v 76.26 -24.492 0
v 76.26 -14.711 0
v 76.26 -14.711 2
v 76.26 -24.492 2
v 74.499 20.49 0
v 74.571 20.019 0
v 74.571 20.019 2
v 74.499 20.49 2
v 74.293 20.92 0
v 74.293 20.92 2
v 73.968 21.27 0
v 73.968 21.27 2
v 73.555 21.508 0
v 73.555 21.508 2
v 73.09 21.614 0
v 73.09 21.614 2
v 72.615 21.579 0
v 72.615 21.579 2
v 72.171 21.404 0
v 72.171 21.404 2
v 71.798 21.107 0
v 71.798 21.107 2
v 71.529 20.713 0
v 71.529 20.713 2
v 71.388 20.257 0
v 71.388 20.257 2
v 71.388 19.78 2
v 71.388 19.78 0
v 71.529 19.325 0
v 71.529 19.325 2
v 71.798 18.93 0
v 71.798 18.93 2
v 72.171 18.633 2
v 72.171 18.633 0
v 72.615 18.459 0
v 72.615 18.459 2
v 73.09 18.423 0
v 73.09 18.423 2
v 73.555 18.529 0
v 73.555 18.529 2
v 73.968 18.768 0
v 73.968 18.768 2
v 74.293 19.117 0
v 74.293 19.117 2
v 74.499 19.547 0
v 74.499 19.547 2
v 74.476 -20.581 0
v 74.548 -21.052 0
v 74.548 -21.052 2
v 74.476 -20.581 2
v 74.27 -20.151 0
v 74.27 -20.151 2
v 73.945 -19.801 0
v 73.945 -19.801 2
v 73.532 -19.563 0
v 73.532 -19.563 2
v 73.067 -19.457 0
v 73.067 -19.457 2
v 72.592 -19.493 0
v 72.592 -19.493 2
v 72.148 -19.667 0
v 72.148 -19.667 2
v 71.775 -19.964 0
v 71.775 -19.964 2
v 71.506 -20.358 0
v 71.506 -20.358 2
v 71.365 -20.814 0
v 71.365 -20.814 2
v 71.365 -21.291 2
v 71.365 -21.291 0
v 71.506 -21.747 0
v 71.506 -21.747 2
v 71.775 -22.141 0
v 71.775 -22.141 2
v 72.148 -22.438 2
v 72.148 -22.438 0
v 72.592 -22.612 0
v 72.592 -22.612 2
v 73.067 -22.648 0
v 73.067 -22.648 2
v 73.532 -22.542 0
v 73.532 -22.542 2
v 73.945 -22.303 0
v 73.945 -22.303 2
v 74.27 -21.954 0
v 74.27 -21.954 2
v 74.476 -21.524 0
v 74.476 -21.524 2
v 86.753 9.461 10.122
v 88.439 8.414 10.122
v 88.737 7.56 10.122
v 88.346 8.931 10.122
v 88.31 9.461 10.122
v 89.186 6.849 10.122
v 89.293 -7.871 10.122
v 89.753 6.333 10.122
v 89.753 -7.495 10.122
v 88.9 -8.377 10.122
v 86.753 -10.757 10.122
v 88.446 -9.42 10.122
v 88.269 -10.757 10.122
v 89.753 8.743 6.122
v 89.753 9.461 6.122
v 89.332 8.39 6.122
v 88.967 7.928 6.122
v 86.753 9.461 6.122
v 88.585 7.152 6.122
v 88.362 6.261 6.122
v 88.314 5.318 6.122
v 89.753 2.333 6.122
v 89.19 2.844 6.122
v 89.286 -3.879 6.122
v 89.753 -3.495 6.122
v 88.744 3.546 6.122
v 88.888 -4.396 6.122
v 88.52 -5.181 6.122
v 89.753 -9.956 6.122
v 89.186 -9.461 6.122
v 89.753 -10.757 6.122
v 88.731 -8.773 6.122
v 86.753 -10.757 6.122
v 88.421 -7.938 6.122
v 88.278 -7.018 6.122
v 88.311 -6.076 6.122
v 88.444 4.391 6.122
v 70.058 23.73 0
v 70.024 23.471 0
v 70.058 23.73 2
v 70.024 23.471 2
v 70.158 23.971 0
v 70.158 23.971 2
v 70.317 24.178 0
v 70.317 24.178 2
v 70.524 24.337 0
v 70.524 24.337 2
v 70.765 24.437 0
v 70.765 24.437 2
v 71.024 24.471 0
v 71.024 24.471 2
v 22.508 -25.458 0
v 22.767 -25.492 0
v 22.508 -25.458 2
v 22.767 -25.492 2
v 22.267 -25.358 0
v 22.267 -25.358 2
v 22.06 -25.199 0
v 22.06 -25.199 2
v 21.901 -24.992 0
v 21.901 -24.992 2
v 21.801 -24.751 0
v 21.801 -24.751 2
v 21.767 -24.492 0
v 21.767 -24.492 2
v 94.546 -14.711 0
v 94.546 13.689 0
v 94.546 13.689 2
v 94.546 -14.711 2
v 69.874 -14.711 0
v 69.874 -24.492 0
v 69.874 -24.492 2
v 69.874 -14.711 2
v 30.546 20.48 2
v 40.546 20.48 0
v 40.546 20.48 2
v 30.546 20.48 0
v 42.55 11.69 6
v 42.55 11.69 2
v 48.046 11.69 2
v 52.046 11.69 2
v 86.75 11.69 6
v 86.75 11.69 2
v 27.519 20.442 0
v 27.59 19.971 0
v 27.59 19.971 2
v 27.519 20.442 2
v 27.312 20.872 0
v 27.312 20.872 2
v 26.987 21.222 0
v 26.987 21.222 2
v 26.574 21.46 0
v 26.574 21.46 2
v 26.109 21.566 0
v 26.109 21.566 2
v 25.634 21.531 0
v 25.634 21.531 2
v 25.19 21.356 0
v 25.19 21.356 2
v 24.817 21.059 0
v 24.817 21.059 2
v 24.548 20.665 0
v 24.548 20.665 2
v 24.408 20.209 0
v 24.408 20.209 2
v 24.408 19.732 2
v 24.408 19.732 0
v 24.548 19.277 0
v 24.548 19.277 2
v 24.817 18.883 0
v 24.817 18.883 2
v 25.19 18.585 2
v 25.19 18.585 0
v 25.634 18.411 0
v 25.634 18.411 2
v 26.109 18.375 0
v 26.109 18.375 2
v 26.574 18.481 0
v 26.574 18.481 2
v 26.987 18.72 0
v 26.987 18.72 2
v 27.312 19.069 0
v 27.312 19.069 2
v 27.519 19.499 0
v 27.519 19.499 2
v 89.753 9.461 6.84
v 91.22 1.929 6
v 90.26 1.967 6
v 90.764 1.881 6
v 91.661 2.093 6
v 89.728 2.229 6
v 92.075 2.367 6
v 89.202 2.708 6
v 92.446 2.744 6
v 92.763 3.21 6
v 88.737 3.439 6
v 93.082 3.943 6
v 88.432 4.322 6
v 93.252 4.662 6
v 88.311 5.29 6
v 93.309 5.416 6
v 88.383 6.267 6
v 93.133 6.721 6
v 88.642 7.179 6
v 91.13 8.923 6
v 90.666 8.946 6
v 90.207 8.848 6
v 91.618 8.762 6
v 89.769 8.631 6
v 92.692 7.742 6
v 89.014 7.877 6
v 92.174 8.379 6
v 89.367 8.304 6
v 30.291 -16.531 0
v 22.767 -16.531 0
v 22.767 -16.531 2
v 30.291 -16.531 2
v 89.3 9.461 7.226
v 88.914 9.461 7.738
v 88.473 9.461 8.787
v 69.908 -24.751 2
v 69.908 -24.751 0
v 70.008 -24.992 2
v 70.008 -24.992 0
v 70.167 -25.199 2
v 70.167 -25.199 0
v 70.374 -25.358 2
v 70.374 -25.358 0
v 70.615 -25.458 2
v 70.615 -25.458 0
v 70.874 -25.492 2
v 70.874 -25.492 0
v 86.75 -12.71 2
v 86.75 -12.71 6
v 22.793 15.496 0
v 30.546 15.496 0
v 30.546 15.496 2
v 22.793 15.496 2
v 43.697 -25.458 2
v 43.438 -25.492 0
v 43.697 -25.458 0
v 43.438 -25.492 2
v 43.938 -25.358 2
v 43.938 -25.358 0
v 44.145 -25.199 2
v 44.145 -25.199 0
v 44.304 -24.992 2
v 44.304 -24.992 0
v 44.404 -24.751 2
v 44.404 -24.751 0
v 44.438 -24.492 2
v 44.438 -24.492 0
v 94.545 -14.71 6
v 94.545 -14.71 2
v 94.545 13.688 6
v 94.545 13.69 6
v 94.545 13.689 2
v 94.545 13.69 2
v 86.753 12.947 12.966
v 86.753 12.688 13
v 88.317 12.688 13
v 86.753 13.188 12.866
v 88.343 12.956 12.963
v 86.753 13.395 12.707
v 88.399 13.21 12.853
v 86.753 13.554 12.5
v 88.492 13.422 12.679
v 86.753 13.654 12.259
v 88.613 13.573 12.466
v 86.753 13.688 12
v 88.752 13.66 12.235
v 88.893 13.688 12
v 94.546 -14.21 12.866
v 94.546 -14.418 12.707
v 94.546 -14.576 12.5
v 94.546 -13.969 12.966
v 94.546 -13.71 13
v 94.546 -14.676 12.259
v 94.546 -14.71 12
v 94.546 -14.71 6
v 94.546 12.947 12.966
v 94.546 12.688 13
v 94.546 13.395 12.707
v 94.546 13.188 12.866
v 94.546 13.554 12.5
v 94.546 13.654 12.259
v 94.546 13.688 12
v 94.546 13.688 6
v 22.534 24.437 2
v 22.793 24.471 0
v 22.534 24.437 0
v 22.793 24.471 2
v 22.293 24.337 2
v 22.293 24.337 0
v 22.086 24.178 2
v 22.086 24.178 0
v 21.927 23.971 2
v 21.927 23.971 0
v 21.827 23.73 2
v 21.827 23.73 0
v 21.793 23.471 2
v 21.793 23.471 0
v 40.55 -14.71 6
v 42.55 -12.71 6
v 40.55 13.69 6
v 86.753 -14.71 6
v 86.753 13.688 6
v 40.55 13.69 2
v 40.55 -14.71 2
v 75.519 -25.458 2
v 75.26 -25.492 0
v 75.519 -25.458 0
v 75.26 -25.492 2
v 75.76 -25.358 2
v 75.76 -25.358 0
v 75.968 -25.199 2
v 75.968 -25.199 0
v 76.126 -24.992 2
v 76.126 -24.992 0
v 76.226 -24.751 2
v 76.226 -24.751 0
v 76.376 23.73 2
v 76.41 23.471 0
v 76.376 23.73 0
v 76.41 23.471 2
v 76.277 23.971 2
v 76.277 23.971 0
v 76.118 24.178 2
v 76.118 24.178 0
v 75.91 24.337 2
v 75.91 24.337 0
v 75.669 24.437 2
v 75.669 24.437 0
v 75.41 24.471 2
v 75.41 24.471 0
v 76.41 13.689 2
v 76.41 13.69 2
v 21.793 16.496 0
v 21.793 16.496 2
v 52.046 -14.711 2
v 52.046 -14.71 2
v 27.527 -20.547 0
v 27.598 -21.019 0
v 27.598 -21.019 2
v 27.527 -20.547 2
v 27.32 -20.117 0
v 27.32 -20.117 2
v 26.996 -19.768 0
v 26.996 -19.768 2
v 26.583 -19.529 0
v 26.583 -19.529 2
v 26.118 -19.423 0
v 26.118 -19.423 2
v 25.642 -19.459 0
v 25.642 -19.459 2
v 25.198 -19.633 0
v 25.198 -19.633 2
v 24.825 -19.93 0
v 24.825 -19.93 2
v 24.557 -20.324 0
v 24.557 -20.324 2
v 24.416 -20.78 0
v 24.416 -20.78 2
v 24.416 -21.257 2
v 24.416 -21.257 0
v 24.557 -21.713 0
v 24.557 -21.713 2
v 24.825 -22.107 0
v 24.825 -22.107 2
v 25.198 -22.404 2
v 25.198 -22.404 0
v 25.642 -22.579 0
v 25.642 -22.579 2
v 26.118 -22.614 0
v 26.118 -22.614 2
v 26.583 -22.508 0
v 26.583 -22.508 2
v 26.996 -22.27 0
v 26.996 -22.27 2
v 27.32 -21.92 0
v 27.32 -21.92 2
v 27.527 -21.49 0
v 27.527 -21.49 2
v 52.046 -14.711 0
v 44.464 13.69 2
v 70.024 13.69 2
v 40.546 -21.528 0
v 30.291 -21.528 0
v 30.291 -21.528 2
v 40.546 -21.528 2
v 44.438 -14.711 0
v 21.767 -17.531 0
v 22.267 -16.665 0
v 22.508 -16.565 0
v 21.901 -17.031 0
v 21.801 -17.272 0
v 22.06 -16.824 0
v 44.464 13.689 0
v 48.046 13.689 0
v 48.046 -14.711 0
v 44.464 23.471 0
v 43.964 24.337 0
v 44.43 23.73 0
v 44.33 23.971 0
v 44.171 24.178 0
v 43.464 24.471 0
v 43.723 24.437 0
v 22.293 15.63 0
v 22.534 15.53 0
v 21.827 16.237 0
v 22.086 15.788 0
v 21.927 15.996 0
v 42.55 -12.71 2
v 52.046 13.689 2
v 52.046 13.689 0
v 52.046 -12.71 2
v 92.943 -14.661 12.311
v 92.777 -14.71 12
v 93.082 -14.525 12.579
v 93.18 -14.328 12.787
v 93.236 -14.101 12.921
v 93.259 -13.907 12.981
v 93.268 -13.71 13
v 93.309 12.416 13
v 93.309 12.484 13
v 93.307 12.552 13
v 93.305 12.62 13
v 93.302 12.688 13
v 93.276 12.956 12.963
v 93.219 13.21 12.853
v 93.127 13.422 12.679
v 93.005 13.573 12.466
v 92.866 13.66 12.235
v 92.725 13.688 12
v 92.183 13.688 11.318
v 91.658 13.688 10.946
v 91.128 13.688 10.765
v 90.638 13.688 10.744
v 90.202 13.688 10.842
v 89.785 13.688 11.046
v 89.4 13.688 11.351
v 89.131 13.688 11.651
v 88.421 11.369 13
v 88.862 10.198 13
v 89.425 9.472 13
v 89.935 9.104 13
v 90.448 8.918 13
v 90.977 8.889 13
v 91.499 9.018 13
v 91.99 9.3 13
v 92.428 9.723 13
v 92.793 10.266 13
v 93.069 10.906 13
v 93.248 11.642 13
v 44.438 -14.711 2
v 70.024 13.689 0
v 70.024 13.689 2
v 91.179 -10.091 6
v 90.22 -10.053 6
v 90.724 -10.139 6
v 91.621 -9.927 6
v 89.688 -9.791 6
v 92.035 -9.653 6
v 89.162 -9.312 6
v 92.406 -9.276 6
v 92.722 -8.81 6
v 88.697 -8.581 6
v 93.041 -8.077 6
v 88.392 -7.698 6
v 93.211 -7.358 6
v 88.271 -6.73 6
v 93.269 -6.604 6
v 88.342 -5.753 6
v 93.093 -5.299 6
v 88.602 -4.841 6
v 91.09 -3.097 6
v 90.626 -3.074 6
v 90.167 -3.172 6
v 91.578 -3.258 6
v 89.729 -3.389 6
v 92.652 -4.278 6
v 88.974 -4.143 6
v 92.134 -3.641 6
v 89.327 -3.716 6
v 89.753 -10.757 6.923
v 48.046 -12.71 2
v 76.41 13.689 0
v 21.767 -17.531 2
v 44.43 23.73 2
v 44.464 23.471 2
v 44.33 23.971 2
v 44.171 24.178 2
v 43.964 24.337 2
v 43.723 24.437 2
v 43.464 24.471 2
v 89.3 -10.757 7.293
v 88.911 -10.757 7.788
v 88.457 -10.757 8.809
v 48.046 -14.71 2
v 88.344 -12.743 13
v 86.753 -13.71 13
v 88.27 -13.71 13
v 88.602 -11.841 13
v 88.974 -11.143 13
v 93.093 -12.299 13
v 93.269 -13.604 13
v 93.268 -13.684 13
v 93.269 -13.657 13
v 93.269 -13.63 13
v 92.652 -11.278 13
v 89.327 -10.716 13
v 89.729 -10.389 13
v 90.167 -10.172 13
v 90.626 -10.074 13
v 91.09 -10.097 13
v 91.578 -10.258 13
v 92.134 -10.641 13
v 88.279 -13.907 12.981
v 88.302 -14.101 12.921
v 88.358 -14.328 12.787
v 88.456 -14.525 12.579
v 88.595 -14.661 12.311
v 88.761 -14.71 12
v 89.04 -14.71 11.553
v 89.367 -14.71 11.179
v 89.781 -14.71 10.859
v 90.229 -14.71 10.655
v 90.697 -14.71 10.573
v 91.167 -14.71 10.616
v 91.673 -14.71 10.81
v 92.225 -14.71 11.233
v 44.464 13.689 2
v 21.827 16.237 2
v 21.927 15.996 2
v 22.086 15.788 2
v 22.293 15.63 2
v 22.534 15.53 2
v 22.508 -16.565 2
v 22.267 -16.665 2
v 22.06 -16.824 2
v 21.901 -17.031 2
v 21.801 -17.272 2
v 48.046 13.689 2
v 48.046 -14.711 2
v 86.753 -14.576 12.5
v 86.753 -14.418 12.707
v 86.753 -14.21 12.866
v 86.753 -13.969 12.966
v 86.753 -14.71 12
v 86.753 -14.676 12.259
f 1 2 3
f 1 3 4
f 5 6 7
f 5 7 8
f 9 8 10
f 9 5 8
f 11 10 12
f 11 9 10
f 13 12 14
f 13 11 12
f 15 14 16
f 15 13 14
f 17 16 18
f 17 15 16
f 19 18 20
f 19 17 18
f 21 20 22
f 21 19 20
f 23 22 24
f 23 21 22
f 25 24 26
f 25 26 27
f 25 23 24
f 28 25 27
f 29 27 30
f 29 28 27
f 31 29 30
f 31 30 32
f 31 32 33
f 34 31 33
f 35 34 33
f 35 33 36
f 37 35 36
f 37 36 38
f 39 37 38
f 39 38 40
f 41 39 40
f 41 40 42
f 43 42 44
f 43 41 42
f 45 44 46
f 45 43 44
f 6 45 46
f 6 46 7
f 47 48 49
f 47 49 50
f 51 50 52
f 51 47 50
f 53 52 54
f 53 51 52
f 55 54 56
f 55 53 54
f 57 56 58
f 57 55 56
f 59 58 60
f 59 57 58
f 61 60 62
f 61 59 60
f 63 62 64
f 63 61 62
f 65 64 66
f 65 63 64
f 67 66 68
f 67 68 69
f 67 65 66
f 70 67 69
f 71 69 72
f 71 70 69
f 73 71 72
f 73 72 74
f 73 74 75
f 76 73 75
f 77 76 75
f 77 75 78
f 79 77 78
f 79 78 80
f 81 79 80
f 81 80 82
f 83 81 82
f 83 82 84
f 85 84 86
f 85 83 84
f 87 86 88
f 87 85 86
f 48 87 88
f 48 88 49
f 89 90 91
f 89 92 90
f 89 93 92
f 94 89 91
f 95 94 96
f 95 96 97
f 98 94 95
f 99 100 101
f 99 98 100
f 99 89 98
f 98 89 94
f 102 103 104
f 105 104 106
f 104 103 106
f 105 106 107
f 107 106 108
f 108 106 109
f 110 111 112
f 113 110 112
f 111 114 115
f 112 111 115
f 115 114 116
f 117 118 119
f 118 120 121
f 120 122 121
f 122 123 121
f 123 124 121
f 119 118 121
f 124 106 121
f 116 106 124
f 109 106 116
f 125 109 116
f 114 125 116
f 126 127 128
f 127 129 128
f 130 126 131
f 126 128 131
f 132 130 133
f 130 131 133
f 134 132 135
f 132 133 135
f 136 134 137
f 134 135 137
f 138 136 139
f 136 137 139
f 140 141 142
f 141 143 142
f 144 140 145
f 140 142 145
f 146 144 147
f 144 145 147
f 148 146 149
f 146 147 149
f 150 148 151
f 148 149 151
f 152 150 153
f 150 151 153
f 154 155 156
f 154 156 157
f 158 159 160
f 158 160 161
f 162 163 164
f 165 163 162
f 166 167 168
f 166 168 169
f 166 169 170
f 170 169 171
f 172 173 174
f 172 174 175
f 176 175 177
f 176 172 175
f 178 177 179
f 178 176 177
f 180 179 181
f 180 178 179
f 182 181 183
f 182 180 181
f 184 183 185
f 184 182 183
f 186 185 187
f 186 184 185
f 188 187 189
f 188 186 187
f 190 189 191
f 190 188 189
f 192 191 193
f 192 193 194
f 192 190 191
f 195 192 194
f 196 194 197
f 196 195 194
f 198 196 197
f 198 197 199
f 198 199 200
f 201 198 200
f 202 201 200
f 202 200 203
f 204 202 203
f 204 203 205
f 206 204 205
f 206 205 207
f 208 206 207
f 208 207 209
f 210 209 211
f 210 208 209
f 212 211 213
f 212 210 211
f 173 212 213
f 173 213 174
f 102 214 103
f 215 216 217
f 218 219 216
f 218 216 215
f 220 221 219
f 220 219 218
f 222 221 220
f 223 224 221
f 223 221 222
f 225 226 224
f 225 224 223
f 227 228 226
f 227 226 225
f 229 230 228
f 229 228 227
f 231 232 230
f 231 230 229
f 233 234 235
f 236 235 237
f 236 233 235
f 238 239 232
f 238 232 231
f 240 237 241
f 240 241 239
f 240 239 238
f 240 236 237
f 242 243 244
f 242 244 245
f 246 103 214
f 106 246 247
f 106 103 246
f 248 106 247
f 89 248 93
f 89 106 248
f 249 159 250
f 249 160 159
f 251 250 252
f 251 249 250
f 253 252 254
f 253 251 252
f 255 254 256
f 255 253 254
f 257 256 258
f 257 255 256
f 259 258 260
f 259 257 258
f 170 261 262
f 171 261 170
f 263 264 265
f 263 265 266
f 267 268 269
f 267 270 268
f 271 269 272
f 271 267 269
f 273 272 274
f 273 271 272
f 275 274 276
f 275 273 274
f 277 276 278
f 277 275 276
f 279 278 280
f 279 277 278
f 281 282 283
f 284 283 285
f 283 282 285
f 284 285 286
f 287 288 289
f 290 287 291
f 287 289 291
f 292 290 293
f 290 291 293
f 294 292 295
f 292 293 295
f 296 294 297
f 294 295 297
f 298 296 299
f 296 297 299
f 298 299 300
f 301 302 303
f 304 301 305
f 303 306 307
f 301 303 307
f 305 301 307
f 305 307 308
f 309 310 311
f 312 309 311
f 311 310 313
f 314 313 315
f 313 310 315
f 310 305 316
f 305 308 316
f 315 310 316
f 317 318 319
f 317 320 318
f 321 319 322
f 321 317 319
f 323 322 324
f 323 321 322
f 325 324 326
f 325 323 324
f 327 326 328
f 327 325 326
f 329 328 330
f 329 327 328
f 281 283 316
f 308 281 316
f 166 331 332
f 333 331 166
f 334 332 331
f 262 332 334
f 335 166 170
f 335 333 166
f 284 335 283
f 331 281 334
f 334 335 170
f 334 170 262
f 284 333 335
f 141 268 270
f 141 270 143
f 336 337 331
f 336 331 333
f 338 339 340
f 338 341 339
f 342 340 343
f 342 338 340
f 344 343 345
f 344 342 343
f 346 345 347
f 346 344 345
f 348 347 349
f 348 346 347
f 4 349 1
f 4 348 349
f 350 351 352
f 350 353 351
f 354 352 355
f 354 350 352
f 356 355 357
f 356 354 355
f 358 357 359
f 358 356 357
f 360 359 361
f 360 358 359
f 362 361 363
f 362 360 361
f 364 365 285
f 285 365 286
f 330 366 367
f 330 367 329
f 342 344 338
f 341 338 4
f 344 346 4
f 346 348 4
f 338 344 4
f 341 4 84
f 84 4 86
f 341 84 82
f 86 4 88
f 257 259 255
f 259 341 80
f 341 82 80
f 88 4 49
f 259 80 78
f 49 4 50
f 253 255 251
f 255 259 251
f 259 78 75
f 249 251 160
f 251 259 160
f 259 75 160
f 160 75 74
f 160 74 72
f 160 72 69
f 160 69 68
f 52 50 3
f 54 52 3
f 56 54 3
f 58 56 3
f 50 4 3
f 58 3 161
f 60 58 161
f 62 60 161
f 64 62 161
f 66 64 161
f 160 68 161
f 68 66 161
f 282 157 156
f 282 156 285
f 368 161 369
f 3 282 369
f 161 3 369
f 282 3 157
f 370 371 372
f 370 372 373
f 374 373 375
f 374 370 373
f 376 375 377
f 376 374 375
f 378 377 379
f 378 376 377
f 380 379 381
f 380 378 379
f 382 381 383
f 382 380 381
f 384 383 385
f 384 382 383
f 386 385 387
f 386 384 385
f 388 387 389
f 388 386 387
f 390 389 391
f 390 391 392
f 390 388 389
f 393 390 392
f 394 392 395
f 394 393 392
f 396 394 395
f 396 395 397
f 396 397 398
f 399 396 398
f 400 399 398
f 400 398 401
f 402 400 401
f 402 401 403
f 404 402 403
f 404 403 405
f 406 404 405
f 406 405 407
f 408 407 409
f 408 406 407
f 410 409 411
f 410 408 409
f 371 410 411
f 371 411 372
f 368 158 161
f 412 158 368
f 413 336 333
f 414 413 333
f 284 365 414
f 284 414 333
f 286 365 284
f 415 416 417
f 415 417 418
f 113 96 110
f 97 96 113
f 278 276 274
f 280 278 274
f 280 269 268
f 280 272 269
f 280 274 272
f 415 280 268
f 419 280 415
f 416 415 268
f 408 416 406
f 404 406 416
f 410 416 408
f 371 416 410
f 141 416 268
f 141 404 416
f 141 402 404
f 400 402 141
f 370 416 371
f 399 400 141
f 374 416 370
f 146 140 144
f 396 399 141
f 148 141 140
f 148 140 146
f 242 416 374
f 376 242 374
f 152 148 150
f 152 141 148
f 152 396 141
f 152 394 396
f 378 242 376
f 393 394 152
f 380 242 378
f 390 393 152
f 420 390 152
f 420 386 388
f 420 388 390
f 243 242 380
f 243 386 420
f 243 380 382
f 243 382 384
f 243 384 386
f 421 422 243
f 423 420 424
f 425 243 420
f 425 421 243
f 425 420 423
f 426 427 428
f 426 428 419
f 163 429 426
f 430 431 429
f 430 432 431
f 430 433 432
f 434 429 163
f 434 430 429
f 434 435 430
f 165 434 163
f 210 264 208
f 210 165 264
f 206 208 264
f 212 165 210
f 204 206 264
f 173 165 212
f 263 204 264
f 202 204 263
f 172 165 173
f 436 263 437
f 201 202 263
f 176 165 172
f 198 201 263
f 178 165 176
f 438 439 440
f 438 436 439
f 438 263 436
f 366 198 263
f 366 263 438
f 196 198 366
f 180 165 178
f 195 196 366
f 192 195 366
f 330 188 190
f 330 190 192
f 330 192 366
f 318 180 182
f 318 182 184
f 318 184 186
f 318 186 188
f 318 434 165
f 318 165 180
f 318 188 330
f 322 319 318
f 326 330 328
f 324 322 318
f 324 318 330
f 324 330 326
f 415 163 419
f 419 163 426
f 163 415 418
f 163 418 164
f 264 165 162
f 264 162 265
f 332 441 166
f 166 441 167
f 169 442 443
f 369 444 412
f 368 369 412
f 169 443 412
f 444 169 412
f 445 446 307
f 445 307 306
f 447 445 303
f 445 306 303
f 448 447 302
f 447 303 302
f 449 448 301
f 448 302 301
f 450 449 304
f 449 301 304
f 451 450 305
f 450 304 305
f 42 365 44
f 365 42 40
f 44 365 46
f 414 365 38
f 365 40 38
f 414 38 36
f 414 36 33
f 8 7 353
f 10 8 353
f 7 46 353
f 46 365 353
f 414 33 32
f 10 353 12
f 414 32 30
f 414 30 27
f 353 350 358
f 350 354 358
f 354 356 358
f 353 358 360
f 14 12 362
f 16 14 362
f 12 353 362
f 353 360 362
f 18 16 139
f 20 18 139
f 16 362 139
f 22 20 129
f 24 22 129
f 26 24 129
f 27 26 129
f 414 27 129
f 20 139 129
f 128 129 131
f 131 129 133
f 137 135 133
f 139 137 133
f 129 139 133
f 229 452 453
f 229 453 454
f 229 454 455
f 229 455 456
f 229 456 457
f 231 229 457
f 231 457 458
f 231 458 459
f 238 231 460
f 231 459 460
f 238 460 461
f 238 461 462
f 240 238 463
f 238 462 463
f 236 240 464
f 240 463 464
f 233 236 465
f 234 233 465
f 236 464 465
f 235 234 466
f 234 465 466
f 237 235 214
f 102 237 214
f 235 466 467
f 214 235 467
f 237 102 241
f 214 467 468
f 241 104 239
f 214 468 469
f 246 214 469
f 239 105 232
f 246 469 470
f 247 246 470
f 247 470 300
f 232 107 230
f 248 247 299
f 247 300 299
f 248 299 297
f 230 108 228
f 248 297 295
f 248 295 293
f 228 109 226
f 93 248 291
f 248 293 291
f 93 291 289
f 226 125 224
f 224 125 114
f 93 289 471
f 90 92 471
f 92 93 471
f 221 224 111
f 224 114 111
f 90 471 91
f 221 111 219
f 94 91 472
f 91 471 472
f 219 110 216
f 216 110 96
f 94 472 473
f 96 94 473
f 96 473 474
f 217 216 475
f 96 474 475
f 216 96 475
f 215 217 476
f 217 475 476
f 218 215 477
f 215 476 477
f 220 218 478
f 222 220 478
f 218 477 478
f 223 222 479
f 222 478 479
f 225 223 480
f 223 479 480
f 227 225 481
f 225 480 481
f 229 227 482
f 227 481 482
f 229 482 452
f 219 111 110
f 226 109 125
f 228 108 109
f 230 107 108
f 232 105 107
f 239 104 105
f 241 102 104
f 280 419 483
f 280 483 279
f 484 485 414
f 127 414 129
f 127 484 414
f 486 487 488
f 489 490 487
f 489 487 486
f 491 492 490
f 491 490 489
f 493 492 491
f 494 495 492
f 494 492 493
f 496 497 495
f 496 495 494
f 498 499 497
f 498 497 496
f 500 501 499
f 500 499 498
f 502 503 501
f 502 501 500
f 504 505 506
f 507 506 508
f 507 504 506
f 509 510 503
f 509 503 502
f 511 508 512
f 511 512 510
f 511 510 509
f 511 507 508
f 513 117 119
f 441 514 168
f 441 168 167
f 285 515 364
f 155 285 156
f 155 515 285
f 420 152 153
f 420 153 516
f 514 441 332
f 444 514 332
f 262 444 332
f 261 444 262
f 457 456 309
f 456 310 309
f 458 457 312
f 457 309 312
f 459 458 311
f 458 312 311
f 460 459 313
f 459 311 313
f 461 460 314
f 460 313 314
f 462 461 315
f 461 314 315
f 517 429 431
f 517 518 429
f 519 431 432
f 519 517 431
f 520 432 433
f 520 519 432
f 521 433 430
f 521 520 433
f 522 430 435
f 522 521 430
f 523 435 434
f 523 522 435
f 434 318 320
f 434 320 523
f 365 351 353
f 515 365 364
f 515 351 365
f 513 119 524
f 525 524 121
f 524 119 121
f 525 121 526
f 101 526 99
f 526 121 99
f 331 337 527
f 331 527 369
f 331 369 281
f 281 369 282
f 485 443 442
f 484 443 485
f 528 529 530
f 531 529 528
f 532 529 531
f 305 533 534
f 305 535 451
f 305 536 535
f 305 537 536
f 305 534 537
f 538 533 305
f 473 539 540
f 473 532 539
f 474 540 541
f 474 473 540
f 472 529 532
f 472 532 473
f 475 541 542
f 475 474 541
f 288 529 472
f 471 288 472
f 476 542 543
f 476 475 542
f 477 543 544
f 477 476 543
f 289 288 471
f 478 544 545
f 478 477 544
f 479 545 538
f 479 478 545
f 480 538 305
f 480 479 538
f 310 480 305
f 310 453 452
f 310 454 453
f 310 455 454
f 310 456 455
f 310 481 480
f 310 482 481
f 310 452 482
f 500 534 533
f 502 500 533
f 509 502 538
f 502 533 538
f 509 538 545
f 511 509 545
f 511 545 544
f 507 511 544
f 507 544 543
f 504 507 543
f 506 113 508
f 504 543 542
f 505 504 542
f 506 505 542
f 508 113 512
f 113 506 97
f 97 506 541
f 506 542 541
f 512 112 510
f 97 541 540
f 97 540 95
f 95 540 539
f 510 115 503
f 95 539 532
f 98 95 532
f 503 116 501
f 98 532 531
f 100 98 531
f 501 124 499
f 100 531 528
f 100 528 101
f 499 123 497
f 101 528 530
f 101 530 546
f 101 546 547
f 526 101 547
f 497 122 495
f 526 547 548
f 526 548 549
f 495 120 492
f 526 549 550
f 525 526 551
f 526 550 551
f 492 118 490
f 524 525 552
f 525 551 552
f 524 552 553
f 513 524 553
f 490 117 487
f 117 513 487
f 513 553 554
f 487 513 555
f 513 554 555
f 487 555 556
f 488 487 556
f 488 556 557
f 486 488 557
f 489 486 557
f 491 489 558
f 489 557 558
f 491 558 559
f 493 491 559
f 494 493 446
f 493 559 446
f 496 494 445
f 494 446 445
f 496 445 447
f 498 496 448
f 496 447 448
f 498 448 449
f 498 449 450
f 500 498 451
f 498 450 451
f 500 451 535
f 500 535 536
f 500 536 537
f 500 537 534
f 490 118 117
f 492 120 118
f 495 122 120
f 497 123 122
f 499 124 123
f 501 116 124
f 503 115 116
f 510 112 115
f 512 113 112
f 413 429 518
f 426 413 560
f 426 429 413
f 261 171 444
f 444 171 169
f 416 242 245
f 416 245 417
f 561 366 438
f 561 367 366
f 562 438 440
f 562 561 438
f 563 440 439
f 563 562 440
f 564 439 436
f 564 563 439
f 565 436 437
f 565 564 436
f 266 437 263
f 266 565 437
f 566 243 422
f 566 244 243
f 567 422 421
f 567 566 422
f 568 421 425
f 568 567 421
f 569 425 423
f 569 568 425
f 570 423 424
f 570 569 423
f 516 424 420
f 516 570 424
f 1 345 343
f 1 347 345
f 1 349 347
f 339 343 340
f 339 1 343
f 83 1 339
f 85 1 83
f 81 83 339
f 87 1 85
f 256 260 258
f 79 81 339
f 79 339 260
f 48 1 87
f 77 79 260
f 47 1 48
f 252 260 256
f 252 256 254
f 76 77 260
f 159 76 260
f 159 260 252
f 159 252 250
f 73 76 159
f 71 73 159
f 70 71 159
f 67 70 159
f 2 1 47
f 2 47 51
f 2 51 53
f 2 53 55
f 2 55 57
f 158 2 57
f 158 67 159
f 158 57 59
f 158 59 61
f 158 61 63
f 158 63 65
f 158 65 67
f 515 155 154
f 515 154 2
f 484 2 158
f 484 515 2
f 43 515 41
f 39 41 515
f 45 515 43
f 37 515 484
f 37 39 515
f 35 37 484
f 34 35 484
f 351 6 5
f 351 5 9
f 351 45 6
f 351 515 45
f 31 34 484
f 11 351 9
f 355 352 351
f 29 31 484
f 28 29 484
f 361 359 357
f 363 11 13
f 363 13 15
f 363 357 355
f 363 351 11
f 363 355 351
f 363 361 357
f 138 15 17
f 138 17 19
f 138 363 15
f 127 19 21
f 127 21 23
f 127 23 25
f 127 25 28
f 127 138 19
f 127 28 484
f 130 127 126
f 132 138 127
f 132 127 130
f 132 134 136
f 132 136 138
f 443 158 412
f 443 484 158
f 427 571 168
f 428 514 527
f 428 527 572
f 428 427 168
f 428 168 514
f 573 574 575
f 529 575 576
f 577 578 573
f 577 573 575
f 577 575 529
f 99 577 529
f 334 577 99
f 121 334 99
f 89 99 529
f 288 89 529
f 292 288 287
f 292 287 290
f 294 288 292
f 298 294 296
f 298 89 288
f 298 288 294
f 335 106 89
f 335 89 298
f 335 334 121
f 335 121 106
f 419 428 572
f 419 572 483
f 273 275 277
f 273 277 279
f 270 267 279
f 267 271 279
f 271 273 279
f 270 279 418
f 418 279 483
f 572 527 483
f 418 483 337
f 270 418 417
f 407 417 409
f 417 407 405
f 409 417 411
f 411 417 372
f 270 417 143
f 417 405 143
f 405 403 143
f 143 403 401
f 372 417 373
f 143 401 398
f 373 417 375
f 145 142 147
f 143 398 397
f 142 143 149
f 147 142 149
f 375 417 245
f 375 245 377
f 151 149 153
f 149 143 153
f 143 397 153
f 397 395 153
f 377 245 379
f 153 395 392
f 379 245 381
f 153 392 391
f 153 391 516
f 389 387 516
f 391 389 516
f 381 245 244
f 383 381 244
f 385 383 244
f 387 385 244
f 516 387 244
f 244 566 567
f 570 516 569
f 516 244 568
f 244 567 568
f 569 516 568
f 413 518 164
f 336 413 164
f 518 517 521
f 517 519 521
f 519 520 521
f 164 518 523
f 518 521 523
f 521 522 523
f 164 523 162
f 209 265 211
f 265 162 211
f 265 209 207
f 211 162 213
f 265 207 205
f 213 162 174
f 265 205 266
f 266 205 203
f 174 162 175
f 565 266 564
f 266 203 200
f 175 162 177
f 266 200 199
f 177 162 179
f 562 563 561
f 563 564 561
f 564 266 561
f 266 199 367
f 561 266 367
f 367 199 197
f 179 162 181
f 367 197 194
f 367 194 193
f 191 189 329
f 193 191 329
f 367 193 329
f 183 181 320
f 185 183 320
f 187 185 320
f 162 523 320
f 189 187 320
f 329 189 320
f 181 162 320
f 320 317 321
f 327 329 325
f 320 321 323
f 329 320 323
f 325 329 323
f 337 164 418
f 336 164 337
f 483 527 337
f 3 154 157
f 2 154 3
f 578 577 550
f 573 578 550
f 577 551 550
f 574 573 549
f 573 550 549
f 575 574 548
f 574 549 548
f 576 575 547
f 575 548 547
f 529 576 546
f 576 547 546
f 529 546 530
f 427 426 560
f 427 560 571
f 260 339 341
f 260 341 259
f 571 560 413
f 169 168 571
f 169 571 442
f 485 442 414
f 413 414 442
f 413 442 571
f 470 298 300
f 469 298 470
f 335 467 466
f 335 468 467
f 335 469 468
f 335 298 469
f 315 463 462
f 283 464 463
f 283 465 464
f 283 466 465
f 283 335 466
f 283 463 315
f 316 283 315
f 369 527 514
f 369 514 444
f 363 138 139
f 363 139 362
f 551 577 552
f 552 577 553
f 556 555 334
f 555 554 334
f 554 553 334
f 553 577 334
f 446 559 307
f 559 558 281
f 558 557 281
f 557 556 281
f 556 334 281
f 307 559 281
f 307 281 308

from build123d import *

# Parameters (mm, degrees)
SKETCH002_R     = 2.5
PAD002_DEPTH    = 7.5
SKETCH003_R     = 2.5
PAD003_DEPTH    = 7.25
SKETCH004_W     = 7.7928
SKETCH004_H     = 28.3985
PAD004_DEPTH    = 7
SKETCH006_W     = 20.21794
SKETCH006_H     = 4
POCKET_DEPTH    = 3
SKETCH_R        = 1.6
PAD_DEPTH       = 2
SKETCH001_W     = 53.9946
SKETCH001_H     = 28.4007
SKETCH001_W_2   = 44.2
SKETCH001_H_2   = 24.4007
PAD001_DEPTH    = 4
FILLET001_R     = 1
FILLET002_R     = 1
SKETCH007_W     = 4
SKETCH007_H     = 31.150972
POCKET001_DEPTH = 2


with BuildPart() as pad002:
    # Sketch002 → Pad002 (new body, symmetric)
    with BuildSketch(Plane(origin=(0.5, -2, 16), x_dir=(1, 0, 0), z_dir=(0, -0.707107, 0.707107))):
        with Locations((90.268963, -10.326332)):
            Circle(SKETCH002_R)
    extrude(amount=PAD002_DEPTH, both=True)


with BuildPart() as pad003:
    # Sketch003 → Pad003 (new body, symmetric)
    with BuildSketch(Plane(origin=(0, 8, 9), x_dir=(1, 0, 0), z_dir=(0, 0.707107, 0.707107))):
        with Locations((90.80912, 0.294413)):
            Circle(SKETCH003_R)
    extrude(amount=PAD003_DEPTH, both=True)


with BuildPart() as pocket:
    # Sketch004 → Pad004 (new body)
    with BuildSketch(Plane.XY.offset(6)):
        with Locations((90.6495, -0.51115)):
            Rectangle(SKETCH004_W, SKETCH004_H)
    extrude(amount=PAD004_DEPTH)

    # Cut: cut Pad003
    add(pad003.part, mode=Mode.SUBTRACT)

    # Cut001: cut Pad002
    add(pad002.part, mode=Mode.SUBTRACT)

    # Sketch006 → Pocket (cut)
    with BuildSketch(Plane(origin=(86.7531, 0, 0), x_dir=(0, -1, 0), z_dir=(-1, 0, 0))):
        with Locations((0.648237, 8.121586)):
            Rectangle(SKETCH006_W, SKETCH006_H)
    extrude(amount=-POCKET_DEPTH, mode=Mode.SUBTRACT)


with BuildPart() as pocket001:
    # Sketch → Pad (new body)
    with BuildSketch(Plane.XY):
        Polygon((21.7667, -25.4923), (21.7667, -16.53082), (30.29072, -16.53082), (30.29072, -21.52783), (40.54589, -21.52783), (40.54589, 20.48012), (30.54589, 20.48012), (30.54589, 15.49558), (21.7928, 15.49558), (21.7928, 24.4708), (44.46409, 24.4708), (44.46409, 13.68925), (70.02404, 13.68925), (70.02404, 24.4708), (76.4105, 24.4708), (76.4105, 13.68925), (94.54589, 13.68925), (94.54589, -14.71075), (76.26045, -14.71075), (76.26045, -25.4923), (69.87399, -25.4923), (69.87399, -14.71075), (44.43799, -14.71075), (44.43799, -25.4923), align=None)
        with Locations((25.98991, 19.9708)):
            Circle(SKETCH_R, mode=Mode.SUBTRACT)
        with Locations((25.99838, -21.01867)):
            Circle(SKETCH_R, mode=Mode.SUBTRACT)
        with Locations((72.97054, 20.01877)):
            Circle(SKETCH_R, mode=Mode.SUBTRACT)
        with Locations((72.94754, -21.05239)):
            Circle(SKETCH_R, mode=Mode.SUBTRACT)
    extrude(amount=PAD_DEPTH)

    # Sketch001 → Pad001 (new body)
    with BuildSketch(Plane.XY.offset(2)):
        with Locations((67.5478, -0.51015)):
            Rectangle(SKETCH001_W, SKETCH001_H)
        with Locations((64.6505, -0.51015)):
            Rectangle(SKETCH001_W_2, SKETCH001_H_2, mode=Mode.SUBTRACT)
    extrude(amount=PAD001_DEPTH)

    # Fusion: union Pocket
    add(pocket.part)

    # Fillet001
    fillet001_edges = [pocket001.edges().sort_by_distance(p)[0] for p in [
        (87.573856, -14.7104, 13),
        (93.844607, -14.7104, 13),
        (93.843844, 13.6881, 13),
        (87.614776, 13.6881, 13),
    ]]
    fillet(fillet001_edges, radius=FILLET001_R)

    # Fillet002
    fillet002_edges = [pocket001.edges().sort_by_distance(p)[0] for p in [
        (76.26045, -25.4923, 1),
        (69.87399, -25.4923, 1),
        (44.43799, -25.4923, 1),
        (21.7667, -25.4923, 1),
        (21.7928, 15.49558, 1),
        (21.7667, -16.53082, 1),
        (21.7928, 24.4708, 1),
        (70.02404, 24.4708, 1),
        (76.4105, 24.4708, 1),
        (44.46409, 24.4708, 1),
    ]]
    fillet(fillet002_edges, radius=FILLET002_R)

    # Sketch007 → Pocket001 (cut)
    with BuildSketch(Plane(origin=(0, 0, 0), x_dir=(1, 0, 0), z_dir=(0, 0, -1))):
        with Locations((50.046217, 0.273968)):
            Rectangle(SKETCH007_W, SKETCH007_H)
    extrude(amount=-POCKET001_DEPTH, mode=Mode.SUBTRACT)


solid = pocket001.part
